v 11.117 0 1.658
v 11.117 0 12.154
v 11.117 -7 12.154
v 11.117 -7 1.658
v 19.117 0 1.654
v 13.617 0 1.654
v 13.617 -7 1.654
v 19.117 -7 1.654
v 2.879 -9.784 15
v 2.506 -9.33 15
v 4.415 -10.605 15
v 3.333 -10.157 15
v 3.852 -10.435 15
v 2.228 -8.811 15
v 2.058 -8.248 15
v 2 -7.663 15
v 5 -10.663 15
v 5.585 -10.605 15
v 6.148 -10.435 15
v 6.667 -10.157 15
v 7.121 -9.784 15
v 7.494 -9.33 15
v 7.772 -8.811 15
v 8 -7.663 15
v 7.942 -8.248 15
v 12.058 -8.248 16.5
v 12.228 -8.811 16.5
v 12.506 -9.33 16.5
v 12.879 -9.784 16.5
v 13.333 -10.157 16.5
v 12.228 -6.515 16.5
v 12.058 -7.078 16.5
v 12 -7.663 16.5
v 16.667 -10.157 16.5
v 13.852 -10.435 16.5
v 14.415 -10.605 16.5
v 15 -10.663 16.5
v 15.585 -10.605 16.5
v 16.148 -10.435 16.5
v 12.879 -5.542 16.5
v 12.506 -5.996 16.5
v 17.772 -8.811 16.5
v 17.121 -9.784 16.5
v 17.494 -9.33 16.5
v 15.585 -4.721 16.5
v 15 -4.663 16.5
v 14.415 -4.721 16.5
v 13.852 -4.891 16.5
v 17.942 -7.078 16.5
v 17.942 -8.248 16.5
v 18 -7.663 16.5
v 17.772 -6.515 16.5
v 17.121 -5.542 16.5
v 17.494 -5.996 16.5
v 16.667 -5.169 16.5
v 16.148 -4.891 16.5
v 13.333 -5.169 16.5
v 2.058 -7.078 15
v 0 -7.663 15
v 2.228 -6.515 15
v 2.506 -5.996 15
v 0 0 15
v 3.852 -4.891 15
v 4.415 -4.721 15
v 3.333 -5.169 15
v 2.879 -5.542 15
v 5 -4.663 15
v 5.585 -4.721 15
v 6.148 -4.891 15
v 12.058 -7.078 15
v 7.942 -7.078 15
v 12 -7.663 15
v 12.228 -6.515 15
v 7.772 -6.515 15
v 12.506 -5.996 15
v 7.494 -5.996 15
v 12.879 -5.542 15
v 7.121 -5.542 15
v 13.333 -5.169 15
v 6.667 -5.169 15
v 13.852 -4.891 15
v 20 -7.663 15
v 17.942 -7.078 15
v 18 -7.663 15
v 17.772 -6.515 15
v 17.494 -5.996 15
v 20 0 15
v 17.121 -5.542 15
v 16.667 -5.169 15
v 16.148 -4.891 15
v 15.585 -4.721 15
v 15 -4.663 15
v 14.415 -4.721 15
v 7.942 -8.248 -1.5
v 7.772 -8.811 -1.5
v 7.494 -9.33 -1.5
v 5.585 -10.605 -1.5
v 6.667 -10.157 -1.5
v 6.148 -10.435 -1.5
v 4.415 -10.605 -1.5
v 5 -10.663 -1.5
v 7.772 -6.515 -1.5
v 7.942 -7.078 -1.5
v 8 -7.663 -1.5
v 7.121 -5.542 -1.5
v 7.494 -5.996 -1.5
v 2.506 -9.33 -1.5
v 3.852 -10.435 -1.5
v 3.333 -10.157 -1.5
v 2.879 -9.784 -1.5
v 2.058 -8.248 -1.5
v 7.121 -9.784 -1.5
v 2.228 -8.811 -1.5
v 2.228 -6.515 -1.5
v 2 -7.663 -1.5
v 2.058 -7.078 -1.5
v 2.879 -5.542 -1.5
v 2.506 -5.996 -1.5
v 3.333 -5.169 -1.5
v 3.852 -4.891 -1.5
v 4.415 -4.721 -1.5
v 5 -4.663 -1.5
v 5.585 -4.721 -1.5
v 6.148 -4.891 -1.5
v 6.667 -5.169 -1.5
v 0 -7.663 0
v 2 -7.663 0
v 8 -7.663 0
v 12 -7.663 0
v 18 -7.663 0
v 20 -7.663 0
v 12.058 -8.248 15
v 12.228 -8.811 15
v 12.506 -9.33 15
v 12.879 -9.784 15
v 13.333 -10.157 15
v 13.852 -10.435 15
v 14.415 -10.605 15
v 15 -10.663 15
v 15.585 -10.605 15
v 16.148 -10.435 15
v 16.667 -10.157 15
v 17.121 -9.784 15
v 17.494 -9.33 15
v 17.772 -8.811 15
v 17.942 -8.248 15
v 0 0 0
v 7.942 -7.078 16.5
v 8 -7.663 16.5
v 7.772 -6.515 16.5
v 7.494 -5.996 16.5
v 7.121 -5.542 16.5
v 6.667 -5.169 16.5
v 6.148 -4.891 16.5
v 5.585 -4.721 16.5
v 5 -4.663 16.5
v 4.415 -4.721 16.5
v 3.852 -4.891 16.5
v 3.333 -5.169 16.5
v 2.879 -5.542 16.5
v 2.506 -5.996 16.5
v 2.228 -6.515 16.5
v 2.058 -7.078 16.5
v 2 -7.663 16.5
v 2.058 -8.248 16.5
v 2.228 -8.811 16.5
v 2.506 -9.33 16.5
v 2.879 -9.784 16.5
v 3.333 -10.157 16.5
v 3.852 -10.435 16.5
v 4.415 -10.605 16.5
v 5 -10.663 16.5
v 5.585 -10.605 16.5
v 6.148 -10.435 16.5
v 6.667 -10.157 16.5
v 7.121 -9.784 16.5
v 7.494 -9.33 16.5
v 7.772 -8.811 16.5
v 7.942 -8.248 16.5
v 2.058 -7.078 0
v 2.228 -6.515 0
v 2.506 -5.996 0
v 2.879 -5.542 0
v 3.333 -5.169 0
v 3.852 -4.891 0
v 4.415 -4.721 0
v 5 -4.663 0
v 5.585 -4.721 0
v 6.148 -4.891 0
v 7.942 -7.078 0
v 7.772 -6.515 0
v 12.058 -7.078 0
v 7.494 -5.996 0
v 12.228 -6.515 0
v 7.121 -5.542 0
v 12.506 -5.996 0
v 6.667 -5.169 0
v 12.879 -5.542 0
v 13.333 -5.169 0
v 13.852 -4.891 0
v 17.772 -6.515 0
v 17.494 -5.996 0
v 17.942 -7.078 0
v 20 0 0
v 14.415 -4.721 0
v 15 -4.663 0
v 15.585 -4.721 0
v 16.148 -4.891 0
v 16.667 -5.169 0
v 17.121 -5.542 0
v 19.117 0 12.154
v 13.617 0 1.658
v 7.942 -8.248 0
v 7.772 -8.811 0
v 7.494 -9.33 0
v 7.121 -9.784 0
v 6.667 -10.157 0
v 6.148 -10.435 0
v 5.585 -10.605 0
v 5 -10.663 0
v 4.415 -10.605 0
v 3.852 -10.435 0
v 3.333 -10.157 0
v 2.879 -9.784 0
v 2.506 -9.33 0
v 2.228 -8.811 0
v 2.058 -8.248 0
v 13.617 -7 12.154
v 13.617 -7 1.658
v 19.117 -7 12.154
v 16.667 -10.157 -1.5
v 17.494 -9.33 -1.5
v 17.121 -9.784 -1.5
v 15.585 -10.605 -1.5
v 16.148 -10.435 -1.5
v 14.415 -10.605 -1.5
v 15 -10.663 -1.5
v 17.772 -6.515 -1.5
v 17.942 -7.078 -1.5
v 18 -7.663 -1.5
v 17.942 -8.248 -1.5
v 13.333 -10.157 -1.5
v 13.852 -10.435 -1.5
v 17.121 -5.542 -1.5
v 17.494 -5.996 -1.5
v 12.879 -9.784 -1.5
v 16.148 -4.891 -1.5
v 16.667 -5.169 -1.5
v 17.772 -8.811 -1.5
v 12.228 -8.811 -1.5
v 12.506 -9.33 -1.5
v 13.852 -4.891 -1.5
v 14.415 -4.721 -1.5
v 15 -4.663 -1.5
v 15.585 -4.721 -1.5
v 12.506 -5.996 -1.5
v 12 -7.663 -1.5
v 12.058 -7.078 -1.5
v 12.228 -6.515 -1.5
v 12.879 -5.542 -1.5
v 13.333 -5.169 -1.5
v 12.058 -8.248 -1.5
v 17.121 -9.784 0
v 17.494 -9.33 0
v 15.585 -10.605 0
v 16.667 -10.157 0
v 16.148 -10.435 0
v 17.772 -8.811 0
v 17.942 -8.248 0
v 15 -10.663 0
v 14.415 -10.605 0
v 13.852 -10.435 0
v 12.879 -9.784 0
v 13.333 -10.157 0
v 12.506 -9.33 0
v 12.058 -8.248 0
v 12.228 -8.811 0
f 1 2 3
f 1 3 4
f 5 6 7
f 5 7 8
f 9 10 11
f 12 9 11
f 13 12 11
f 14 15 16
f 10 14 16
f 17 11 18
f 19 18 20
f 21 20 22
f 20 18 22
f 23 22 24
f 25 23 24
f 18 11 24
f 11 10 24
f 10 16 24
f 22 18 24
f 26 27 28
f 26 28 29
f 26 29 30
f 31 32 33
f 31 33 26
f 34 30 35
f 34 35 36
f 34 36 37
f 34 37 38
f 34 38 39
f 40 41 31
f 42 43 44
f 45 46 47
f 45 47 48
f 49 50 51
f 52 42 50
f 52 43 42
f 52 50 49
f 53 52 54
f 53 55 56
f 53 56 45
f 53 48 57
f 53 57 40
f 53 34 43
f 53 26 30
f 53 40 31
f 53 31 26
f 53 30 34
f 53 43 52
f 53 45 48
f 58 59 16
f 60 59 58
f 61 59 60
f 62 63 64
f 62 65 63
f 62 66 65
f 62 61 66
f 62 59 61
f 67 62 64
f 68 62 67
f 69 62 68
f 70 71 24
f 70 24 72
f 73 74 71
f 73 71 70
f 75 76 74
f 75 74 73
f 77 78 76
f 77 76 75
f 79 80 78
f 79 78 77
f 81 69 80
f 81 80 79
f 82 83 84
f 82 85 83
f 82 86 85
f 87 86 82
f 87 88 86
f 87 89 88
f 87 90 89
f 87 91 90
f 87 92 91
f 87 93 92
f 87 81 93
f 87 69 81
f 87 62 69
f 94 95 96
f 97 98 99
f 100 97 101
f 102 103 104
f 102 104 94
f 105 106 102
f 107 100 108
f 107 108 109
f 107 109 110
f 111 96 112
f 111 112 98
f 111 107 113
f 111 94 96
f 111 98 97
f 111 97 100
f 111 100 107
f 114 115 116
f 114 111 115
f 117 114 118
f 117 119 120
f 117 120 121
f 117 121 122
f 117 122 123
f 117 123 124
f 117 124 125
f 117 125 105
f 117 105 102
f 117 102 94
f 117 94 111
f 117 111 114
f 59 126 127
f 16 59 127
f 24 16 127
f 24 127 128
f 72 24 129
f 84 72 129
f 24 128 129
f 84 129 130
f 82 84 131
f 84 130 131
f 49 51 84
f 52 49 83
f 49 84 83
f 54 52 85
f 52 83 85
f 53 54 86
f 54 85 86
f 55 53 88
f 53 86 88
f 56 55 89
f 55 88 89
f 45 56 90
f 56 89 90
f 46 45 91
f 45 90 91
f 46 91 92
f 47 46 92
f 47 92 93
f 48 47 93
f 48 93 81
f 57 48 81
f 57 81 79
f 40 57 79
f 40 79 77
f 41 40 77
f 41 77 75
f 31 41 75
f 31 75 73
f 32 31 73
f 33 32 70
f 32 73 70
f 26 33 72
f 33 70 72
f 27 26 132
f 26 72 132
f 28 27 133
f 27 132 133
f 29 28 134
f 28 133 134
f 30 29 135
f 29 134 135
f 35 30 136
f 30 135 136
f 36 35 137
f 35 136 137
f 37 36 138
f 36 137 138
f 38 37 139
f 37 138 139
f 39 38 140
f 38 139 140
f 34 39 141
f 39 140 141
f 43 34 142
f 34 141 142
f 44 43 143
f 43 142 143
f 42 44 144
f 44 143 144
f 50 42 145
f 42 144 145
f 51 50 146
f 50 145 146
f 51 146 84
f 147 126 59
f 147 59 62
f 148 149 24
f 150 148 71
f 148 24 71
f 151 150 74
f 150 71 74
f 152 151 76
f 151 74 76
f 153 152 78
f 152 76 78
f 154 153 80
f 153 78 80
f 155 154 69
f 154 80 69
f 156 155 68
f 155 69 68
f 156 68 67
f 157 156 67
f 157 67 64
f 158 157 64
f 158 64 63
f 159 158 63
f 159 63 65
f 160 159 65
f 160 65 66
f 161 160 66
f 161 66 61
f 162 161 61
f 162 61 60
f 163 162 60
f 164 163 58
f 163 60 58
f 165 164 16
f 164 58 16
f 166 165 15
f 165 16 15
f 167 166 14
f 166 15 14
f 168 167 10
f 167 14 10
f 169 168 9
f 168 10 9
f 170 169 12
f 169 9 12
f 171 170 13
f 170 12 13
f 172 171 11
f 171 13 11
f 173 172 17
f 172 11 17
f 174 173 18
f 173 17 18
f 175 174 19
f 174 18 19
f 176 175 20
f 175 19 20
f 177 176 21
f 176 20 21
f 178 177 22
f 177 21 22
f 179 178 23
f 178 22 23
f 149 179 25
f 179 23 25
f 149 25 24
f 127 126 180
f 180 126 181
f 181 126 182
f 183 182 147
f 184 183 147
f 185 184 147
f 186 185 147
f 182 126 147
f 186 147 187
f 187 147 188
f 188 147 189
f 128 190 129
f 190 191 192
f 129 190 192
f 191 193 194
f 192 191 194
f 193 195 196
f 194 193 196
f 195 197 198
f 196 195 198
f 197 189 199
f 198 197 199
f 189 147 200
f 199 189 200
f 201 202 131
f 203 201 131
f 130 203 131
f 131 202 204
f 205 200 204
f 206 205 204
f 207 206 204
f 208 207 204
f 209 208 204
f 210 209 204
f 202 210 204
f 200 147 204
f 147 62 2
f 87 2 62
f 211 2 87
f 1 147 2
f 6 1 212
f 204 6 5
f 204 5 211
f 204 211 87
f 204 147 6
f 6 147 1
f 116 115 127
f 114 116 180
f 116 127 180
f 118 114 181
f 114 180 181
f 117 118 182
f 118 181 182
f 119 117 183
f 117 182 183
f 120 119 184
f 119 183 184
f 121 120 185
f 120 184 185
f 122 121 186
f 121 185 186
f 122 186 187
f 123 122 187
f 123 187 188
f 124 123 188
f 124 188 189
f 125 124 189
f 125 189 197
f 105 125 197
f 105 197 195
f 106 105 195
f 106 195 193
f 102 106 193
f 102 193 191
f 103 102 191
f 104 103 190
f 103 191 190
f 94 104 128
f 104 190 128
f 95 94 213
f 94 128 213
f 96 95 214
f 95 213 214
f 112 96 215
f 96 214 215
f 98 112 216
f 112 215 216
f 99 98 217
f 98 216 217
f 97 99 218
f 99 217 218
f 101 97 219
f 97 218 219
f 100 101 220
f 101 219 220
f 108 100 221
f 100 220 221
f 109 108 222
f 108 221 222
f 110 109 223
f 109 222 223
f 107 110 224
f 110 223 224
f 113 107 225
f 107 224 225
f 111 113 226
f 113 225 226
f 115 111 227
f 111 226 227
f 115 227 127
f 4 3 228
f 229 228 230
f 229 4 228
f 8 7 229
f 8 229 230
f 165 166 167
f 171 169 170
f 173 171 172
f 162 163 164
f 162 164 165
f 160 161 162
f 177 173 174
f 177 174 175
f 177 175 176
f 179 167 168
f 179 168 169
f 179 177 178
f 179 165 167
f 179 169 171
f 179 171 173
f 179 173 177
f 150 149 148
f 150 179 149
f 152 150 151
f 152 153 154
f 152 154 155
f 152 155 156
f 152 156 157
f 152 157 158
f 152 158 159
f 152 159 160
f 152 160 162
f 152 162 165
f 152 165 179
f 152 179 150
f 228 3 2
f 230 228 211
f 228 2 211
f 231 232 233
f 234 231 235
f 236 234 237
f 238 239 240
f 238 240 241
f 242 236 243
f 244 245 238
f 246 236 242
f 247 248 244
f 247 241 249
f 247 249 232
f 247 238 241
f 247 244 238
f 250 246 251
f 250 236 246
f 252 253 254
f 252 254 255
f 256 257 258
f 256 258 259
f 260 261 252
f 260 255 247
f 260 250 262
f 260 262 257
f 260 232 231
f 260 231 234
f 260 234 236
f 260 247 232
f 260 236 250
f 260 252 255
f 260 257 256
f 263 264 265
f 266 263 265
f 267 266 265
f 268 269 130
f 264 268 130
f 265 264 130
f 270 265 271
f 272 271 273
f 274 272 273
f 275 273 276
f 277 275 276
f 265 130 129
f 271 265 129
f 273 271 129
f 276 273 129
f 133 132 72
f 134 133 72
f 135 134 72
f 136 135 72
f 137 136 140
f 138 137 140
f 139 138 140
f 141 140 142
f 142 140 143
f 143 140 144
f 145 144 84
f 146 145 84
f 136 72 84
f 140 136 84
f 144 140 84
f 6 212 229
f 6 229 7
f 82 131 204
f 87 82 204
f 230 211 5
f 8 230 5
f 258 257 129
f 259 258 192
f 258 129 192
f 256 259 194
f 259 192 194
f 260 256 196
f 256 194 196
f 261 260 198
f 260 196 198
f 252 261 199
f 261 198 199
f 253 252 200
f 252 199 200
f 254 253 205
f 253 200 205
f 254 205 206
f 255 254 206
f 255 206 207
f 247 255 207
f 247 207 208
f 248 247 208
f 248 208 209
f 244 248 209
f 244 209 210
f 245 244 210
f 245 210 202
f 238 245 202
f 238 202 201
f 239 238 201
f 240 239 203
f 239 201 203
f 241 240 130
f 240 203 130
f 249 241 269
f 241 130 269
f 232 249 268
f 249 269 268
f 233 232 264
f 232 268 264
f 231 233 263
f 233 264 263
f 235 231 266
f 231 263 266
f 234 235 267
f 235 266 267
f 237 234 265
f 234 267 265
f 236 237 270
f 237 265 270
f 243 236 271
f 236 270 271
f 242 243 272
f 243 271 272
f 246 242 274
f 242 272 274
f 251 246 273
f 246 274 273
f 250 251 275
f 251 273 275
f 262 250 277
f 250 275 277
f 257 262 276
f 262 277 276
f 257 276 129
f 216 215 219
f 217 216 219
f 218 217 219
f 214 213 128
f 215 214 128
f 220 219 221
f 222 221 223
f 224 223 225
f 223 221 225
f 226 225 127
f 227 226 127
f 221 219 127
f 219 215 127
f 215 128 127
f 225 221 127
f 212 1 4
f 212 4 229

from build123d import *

# Parameters (mm, degrees)
SKETCH7_W           = 20
SKETCH7_H           = 7.663039205
BOSS_EXTRUDE2_DEPTH = 15
SKETCH8_W           = 5.5
SKETCH8_H           = 10.5
CUT_EXTRUDE3_DEPTH  = 7
SKETCH9_R           = 3
BOSS_EXTRUDE4_DEPTH = 1.5
SKETCH11_R          = 3
BOSS_EXTRUDE6_DEPTH = 1.5
SKETCH12_R          = 3
BOSS_EXTRUDE7_DEPTH = 1.5
SKETCH13_W          = 2.5
SKETCH13_H          = 10.495878043
CUT_EXTRUDE4_DEPTH  = 7


with BuildPart() as part:
    # Sketch7 → Boss-Extrude2 (new body)
    with BuildSketch(Plane.XY):
        with Locations((10, -3.831519603)):
            Rectangle(SKETCH7_W, SKETCH7_H)
    extrude(amount=BOSS_EXTRUDE2_DEPTH)

    # Sketch8 → Cut-Extrude3 (cut)
    with BuildSketch(Plane(origin=(0, 0, 0), x_dir=(1, 0, 0), z_dir=(0, 1, 0))):
        with Locations((16.367319257, -6.904304489)):
            Rectangle(SKETCH8_W, SKETCH8_H)
    extrude(amount=-CUT_EXTRUDE3_DEPTH, mode=Mode.SUBTRACT)

    # Sketch9 → Boss-Extrude4 (add)
    with BuildSketch(Plane.XY.offset(15)):
        with Locations((15, -7.663039205)):
            Circle(SKETCH9_R)
    extrude(amount=BOSS_EXTRUDE4_DEPTH)

    # Sketch11 → Boss-Extrude6 (add)
    with BuildSketch(Plane.XY.offset(15)):
        with Locations((5, -7.663039205)):
            Circle(SKETCH11_R)
    extrude(amount=BOSS_EXTRUDE6_DEPTH)

    # Sketch12 → Boss-Extrude7 (add)
    with BuildSketch(Plane(origin=(0, 0, 0), x_dir=(-1, 0, 0), z_dir=(0, 0, -1))):
        with Locations((-15, -7.663039205)):
            Circle(SKETCH12_R)
        with Locations((-5, -7.663039205)):
            Circle(SKETCH12_R)
    extrude(amount=BOSS_EXTRUDE7_DEPTH)

    # Sketch13 → Cut-Extrude4 (cut)
    with BuildSketch(Plane(origin=(0, 0, 0), x_dir=(1, 0, 0), z_dir=(0, 1, 0))):
        with Locations((12.367319257, -6.906365468)):
            Rectangle(SKETCH13_W, SKETCH13_H)
    extrude(amount=-CUT_EXTRUDE4_DEPTH, mode=Mode.SUBTRACT)


solid = part.part
